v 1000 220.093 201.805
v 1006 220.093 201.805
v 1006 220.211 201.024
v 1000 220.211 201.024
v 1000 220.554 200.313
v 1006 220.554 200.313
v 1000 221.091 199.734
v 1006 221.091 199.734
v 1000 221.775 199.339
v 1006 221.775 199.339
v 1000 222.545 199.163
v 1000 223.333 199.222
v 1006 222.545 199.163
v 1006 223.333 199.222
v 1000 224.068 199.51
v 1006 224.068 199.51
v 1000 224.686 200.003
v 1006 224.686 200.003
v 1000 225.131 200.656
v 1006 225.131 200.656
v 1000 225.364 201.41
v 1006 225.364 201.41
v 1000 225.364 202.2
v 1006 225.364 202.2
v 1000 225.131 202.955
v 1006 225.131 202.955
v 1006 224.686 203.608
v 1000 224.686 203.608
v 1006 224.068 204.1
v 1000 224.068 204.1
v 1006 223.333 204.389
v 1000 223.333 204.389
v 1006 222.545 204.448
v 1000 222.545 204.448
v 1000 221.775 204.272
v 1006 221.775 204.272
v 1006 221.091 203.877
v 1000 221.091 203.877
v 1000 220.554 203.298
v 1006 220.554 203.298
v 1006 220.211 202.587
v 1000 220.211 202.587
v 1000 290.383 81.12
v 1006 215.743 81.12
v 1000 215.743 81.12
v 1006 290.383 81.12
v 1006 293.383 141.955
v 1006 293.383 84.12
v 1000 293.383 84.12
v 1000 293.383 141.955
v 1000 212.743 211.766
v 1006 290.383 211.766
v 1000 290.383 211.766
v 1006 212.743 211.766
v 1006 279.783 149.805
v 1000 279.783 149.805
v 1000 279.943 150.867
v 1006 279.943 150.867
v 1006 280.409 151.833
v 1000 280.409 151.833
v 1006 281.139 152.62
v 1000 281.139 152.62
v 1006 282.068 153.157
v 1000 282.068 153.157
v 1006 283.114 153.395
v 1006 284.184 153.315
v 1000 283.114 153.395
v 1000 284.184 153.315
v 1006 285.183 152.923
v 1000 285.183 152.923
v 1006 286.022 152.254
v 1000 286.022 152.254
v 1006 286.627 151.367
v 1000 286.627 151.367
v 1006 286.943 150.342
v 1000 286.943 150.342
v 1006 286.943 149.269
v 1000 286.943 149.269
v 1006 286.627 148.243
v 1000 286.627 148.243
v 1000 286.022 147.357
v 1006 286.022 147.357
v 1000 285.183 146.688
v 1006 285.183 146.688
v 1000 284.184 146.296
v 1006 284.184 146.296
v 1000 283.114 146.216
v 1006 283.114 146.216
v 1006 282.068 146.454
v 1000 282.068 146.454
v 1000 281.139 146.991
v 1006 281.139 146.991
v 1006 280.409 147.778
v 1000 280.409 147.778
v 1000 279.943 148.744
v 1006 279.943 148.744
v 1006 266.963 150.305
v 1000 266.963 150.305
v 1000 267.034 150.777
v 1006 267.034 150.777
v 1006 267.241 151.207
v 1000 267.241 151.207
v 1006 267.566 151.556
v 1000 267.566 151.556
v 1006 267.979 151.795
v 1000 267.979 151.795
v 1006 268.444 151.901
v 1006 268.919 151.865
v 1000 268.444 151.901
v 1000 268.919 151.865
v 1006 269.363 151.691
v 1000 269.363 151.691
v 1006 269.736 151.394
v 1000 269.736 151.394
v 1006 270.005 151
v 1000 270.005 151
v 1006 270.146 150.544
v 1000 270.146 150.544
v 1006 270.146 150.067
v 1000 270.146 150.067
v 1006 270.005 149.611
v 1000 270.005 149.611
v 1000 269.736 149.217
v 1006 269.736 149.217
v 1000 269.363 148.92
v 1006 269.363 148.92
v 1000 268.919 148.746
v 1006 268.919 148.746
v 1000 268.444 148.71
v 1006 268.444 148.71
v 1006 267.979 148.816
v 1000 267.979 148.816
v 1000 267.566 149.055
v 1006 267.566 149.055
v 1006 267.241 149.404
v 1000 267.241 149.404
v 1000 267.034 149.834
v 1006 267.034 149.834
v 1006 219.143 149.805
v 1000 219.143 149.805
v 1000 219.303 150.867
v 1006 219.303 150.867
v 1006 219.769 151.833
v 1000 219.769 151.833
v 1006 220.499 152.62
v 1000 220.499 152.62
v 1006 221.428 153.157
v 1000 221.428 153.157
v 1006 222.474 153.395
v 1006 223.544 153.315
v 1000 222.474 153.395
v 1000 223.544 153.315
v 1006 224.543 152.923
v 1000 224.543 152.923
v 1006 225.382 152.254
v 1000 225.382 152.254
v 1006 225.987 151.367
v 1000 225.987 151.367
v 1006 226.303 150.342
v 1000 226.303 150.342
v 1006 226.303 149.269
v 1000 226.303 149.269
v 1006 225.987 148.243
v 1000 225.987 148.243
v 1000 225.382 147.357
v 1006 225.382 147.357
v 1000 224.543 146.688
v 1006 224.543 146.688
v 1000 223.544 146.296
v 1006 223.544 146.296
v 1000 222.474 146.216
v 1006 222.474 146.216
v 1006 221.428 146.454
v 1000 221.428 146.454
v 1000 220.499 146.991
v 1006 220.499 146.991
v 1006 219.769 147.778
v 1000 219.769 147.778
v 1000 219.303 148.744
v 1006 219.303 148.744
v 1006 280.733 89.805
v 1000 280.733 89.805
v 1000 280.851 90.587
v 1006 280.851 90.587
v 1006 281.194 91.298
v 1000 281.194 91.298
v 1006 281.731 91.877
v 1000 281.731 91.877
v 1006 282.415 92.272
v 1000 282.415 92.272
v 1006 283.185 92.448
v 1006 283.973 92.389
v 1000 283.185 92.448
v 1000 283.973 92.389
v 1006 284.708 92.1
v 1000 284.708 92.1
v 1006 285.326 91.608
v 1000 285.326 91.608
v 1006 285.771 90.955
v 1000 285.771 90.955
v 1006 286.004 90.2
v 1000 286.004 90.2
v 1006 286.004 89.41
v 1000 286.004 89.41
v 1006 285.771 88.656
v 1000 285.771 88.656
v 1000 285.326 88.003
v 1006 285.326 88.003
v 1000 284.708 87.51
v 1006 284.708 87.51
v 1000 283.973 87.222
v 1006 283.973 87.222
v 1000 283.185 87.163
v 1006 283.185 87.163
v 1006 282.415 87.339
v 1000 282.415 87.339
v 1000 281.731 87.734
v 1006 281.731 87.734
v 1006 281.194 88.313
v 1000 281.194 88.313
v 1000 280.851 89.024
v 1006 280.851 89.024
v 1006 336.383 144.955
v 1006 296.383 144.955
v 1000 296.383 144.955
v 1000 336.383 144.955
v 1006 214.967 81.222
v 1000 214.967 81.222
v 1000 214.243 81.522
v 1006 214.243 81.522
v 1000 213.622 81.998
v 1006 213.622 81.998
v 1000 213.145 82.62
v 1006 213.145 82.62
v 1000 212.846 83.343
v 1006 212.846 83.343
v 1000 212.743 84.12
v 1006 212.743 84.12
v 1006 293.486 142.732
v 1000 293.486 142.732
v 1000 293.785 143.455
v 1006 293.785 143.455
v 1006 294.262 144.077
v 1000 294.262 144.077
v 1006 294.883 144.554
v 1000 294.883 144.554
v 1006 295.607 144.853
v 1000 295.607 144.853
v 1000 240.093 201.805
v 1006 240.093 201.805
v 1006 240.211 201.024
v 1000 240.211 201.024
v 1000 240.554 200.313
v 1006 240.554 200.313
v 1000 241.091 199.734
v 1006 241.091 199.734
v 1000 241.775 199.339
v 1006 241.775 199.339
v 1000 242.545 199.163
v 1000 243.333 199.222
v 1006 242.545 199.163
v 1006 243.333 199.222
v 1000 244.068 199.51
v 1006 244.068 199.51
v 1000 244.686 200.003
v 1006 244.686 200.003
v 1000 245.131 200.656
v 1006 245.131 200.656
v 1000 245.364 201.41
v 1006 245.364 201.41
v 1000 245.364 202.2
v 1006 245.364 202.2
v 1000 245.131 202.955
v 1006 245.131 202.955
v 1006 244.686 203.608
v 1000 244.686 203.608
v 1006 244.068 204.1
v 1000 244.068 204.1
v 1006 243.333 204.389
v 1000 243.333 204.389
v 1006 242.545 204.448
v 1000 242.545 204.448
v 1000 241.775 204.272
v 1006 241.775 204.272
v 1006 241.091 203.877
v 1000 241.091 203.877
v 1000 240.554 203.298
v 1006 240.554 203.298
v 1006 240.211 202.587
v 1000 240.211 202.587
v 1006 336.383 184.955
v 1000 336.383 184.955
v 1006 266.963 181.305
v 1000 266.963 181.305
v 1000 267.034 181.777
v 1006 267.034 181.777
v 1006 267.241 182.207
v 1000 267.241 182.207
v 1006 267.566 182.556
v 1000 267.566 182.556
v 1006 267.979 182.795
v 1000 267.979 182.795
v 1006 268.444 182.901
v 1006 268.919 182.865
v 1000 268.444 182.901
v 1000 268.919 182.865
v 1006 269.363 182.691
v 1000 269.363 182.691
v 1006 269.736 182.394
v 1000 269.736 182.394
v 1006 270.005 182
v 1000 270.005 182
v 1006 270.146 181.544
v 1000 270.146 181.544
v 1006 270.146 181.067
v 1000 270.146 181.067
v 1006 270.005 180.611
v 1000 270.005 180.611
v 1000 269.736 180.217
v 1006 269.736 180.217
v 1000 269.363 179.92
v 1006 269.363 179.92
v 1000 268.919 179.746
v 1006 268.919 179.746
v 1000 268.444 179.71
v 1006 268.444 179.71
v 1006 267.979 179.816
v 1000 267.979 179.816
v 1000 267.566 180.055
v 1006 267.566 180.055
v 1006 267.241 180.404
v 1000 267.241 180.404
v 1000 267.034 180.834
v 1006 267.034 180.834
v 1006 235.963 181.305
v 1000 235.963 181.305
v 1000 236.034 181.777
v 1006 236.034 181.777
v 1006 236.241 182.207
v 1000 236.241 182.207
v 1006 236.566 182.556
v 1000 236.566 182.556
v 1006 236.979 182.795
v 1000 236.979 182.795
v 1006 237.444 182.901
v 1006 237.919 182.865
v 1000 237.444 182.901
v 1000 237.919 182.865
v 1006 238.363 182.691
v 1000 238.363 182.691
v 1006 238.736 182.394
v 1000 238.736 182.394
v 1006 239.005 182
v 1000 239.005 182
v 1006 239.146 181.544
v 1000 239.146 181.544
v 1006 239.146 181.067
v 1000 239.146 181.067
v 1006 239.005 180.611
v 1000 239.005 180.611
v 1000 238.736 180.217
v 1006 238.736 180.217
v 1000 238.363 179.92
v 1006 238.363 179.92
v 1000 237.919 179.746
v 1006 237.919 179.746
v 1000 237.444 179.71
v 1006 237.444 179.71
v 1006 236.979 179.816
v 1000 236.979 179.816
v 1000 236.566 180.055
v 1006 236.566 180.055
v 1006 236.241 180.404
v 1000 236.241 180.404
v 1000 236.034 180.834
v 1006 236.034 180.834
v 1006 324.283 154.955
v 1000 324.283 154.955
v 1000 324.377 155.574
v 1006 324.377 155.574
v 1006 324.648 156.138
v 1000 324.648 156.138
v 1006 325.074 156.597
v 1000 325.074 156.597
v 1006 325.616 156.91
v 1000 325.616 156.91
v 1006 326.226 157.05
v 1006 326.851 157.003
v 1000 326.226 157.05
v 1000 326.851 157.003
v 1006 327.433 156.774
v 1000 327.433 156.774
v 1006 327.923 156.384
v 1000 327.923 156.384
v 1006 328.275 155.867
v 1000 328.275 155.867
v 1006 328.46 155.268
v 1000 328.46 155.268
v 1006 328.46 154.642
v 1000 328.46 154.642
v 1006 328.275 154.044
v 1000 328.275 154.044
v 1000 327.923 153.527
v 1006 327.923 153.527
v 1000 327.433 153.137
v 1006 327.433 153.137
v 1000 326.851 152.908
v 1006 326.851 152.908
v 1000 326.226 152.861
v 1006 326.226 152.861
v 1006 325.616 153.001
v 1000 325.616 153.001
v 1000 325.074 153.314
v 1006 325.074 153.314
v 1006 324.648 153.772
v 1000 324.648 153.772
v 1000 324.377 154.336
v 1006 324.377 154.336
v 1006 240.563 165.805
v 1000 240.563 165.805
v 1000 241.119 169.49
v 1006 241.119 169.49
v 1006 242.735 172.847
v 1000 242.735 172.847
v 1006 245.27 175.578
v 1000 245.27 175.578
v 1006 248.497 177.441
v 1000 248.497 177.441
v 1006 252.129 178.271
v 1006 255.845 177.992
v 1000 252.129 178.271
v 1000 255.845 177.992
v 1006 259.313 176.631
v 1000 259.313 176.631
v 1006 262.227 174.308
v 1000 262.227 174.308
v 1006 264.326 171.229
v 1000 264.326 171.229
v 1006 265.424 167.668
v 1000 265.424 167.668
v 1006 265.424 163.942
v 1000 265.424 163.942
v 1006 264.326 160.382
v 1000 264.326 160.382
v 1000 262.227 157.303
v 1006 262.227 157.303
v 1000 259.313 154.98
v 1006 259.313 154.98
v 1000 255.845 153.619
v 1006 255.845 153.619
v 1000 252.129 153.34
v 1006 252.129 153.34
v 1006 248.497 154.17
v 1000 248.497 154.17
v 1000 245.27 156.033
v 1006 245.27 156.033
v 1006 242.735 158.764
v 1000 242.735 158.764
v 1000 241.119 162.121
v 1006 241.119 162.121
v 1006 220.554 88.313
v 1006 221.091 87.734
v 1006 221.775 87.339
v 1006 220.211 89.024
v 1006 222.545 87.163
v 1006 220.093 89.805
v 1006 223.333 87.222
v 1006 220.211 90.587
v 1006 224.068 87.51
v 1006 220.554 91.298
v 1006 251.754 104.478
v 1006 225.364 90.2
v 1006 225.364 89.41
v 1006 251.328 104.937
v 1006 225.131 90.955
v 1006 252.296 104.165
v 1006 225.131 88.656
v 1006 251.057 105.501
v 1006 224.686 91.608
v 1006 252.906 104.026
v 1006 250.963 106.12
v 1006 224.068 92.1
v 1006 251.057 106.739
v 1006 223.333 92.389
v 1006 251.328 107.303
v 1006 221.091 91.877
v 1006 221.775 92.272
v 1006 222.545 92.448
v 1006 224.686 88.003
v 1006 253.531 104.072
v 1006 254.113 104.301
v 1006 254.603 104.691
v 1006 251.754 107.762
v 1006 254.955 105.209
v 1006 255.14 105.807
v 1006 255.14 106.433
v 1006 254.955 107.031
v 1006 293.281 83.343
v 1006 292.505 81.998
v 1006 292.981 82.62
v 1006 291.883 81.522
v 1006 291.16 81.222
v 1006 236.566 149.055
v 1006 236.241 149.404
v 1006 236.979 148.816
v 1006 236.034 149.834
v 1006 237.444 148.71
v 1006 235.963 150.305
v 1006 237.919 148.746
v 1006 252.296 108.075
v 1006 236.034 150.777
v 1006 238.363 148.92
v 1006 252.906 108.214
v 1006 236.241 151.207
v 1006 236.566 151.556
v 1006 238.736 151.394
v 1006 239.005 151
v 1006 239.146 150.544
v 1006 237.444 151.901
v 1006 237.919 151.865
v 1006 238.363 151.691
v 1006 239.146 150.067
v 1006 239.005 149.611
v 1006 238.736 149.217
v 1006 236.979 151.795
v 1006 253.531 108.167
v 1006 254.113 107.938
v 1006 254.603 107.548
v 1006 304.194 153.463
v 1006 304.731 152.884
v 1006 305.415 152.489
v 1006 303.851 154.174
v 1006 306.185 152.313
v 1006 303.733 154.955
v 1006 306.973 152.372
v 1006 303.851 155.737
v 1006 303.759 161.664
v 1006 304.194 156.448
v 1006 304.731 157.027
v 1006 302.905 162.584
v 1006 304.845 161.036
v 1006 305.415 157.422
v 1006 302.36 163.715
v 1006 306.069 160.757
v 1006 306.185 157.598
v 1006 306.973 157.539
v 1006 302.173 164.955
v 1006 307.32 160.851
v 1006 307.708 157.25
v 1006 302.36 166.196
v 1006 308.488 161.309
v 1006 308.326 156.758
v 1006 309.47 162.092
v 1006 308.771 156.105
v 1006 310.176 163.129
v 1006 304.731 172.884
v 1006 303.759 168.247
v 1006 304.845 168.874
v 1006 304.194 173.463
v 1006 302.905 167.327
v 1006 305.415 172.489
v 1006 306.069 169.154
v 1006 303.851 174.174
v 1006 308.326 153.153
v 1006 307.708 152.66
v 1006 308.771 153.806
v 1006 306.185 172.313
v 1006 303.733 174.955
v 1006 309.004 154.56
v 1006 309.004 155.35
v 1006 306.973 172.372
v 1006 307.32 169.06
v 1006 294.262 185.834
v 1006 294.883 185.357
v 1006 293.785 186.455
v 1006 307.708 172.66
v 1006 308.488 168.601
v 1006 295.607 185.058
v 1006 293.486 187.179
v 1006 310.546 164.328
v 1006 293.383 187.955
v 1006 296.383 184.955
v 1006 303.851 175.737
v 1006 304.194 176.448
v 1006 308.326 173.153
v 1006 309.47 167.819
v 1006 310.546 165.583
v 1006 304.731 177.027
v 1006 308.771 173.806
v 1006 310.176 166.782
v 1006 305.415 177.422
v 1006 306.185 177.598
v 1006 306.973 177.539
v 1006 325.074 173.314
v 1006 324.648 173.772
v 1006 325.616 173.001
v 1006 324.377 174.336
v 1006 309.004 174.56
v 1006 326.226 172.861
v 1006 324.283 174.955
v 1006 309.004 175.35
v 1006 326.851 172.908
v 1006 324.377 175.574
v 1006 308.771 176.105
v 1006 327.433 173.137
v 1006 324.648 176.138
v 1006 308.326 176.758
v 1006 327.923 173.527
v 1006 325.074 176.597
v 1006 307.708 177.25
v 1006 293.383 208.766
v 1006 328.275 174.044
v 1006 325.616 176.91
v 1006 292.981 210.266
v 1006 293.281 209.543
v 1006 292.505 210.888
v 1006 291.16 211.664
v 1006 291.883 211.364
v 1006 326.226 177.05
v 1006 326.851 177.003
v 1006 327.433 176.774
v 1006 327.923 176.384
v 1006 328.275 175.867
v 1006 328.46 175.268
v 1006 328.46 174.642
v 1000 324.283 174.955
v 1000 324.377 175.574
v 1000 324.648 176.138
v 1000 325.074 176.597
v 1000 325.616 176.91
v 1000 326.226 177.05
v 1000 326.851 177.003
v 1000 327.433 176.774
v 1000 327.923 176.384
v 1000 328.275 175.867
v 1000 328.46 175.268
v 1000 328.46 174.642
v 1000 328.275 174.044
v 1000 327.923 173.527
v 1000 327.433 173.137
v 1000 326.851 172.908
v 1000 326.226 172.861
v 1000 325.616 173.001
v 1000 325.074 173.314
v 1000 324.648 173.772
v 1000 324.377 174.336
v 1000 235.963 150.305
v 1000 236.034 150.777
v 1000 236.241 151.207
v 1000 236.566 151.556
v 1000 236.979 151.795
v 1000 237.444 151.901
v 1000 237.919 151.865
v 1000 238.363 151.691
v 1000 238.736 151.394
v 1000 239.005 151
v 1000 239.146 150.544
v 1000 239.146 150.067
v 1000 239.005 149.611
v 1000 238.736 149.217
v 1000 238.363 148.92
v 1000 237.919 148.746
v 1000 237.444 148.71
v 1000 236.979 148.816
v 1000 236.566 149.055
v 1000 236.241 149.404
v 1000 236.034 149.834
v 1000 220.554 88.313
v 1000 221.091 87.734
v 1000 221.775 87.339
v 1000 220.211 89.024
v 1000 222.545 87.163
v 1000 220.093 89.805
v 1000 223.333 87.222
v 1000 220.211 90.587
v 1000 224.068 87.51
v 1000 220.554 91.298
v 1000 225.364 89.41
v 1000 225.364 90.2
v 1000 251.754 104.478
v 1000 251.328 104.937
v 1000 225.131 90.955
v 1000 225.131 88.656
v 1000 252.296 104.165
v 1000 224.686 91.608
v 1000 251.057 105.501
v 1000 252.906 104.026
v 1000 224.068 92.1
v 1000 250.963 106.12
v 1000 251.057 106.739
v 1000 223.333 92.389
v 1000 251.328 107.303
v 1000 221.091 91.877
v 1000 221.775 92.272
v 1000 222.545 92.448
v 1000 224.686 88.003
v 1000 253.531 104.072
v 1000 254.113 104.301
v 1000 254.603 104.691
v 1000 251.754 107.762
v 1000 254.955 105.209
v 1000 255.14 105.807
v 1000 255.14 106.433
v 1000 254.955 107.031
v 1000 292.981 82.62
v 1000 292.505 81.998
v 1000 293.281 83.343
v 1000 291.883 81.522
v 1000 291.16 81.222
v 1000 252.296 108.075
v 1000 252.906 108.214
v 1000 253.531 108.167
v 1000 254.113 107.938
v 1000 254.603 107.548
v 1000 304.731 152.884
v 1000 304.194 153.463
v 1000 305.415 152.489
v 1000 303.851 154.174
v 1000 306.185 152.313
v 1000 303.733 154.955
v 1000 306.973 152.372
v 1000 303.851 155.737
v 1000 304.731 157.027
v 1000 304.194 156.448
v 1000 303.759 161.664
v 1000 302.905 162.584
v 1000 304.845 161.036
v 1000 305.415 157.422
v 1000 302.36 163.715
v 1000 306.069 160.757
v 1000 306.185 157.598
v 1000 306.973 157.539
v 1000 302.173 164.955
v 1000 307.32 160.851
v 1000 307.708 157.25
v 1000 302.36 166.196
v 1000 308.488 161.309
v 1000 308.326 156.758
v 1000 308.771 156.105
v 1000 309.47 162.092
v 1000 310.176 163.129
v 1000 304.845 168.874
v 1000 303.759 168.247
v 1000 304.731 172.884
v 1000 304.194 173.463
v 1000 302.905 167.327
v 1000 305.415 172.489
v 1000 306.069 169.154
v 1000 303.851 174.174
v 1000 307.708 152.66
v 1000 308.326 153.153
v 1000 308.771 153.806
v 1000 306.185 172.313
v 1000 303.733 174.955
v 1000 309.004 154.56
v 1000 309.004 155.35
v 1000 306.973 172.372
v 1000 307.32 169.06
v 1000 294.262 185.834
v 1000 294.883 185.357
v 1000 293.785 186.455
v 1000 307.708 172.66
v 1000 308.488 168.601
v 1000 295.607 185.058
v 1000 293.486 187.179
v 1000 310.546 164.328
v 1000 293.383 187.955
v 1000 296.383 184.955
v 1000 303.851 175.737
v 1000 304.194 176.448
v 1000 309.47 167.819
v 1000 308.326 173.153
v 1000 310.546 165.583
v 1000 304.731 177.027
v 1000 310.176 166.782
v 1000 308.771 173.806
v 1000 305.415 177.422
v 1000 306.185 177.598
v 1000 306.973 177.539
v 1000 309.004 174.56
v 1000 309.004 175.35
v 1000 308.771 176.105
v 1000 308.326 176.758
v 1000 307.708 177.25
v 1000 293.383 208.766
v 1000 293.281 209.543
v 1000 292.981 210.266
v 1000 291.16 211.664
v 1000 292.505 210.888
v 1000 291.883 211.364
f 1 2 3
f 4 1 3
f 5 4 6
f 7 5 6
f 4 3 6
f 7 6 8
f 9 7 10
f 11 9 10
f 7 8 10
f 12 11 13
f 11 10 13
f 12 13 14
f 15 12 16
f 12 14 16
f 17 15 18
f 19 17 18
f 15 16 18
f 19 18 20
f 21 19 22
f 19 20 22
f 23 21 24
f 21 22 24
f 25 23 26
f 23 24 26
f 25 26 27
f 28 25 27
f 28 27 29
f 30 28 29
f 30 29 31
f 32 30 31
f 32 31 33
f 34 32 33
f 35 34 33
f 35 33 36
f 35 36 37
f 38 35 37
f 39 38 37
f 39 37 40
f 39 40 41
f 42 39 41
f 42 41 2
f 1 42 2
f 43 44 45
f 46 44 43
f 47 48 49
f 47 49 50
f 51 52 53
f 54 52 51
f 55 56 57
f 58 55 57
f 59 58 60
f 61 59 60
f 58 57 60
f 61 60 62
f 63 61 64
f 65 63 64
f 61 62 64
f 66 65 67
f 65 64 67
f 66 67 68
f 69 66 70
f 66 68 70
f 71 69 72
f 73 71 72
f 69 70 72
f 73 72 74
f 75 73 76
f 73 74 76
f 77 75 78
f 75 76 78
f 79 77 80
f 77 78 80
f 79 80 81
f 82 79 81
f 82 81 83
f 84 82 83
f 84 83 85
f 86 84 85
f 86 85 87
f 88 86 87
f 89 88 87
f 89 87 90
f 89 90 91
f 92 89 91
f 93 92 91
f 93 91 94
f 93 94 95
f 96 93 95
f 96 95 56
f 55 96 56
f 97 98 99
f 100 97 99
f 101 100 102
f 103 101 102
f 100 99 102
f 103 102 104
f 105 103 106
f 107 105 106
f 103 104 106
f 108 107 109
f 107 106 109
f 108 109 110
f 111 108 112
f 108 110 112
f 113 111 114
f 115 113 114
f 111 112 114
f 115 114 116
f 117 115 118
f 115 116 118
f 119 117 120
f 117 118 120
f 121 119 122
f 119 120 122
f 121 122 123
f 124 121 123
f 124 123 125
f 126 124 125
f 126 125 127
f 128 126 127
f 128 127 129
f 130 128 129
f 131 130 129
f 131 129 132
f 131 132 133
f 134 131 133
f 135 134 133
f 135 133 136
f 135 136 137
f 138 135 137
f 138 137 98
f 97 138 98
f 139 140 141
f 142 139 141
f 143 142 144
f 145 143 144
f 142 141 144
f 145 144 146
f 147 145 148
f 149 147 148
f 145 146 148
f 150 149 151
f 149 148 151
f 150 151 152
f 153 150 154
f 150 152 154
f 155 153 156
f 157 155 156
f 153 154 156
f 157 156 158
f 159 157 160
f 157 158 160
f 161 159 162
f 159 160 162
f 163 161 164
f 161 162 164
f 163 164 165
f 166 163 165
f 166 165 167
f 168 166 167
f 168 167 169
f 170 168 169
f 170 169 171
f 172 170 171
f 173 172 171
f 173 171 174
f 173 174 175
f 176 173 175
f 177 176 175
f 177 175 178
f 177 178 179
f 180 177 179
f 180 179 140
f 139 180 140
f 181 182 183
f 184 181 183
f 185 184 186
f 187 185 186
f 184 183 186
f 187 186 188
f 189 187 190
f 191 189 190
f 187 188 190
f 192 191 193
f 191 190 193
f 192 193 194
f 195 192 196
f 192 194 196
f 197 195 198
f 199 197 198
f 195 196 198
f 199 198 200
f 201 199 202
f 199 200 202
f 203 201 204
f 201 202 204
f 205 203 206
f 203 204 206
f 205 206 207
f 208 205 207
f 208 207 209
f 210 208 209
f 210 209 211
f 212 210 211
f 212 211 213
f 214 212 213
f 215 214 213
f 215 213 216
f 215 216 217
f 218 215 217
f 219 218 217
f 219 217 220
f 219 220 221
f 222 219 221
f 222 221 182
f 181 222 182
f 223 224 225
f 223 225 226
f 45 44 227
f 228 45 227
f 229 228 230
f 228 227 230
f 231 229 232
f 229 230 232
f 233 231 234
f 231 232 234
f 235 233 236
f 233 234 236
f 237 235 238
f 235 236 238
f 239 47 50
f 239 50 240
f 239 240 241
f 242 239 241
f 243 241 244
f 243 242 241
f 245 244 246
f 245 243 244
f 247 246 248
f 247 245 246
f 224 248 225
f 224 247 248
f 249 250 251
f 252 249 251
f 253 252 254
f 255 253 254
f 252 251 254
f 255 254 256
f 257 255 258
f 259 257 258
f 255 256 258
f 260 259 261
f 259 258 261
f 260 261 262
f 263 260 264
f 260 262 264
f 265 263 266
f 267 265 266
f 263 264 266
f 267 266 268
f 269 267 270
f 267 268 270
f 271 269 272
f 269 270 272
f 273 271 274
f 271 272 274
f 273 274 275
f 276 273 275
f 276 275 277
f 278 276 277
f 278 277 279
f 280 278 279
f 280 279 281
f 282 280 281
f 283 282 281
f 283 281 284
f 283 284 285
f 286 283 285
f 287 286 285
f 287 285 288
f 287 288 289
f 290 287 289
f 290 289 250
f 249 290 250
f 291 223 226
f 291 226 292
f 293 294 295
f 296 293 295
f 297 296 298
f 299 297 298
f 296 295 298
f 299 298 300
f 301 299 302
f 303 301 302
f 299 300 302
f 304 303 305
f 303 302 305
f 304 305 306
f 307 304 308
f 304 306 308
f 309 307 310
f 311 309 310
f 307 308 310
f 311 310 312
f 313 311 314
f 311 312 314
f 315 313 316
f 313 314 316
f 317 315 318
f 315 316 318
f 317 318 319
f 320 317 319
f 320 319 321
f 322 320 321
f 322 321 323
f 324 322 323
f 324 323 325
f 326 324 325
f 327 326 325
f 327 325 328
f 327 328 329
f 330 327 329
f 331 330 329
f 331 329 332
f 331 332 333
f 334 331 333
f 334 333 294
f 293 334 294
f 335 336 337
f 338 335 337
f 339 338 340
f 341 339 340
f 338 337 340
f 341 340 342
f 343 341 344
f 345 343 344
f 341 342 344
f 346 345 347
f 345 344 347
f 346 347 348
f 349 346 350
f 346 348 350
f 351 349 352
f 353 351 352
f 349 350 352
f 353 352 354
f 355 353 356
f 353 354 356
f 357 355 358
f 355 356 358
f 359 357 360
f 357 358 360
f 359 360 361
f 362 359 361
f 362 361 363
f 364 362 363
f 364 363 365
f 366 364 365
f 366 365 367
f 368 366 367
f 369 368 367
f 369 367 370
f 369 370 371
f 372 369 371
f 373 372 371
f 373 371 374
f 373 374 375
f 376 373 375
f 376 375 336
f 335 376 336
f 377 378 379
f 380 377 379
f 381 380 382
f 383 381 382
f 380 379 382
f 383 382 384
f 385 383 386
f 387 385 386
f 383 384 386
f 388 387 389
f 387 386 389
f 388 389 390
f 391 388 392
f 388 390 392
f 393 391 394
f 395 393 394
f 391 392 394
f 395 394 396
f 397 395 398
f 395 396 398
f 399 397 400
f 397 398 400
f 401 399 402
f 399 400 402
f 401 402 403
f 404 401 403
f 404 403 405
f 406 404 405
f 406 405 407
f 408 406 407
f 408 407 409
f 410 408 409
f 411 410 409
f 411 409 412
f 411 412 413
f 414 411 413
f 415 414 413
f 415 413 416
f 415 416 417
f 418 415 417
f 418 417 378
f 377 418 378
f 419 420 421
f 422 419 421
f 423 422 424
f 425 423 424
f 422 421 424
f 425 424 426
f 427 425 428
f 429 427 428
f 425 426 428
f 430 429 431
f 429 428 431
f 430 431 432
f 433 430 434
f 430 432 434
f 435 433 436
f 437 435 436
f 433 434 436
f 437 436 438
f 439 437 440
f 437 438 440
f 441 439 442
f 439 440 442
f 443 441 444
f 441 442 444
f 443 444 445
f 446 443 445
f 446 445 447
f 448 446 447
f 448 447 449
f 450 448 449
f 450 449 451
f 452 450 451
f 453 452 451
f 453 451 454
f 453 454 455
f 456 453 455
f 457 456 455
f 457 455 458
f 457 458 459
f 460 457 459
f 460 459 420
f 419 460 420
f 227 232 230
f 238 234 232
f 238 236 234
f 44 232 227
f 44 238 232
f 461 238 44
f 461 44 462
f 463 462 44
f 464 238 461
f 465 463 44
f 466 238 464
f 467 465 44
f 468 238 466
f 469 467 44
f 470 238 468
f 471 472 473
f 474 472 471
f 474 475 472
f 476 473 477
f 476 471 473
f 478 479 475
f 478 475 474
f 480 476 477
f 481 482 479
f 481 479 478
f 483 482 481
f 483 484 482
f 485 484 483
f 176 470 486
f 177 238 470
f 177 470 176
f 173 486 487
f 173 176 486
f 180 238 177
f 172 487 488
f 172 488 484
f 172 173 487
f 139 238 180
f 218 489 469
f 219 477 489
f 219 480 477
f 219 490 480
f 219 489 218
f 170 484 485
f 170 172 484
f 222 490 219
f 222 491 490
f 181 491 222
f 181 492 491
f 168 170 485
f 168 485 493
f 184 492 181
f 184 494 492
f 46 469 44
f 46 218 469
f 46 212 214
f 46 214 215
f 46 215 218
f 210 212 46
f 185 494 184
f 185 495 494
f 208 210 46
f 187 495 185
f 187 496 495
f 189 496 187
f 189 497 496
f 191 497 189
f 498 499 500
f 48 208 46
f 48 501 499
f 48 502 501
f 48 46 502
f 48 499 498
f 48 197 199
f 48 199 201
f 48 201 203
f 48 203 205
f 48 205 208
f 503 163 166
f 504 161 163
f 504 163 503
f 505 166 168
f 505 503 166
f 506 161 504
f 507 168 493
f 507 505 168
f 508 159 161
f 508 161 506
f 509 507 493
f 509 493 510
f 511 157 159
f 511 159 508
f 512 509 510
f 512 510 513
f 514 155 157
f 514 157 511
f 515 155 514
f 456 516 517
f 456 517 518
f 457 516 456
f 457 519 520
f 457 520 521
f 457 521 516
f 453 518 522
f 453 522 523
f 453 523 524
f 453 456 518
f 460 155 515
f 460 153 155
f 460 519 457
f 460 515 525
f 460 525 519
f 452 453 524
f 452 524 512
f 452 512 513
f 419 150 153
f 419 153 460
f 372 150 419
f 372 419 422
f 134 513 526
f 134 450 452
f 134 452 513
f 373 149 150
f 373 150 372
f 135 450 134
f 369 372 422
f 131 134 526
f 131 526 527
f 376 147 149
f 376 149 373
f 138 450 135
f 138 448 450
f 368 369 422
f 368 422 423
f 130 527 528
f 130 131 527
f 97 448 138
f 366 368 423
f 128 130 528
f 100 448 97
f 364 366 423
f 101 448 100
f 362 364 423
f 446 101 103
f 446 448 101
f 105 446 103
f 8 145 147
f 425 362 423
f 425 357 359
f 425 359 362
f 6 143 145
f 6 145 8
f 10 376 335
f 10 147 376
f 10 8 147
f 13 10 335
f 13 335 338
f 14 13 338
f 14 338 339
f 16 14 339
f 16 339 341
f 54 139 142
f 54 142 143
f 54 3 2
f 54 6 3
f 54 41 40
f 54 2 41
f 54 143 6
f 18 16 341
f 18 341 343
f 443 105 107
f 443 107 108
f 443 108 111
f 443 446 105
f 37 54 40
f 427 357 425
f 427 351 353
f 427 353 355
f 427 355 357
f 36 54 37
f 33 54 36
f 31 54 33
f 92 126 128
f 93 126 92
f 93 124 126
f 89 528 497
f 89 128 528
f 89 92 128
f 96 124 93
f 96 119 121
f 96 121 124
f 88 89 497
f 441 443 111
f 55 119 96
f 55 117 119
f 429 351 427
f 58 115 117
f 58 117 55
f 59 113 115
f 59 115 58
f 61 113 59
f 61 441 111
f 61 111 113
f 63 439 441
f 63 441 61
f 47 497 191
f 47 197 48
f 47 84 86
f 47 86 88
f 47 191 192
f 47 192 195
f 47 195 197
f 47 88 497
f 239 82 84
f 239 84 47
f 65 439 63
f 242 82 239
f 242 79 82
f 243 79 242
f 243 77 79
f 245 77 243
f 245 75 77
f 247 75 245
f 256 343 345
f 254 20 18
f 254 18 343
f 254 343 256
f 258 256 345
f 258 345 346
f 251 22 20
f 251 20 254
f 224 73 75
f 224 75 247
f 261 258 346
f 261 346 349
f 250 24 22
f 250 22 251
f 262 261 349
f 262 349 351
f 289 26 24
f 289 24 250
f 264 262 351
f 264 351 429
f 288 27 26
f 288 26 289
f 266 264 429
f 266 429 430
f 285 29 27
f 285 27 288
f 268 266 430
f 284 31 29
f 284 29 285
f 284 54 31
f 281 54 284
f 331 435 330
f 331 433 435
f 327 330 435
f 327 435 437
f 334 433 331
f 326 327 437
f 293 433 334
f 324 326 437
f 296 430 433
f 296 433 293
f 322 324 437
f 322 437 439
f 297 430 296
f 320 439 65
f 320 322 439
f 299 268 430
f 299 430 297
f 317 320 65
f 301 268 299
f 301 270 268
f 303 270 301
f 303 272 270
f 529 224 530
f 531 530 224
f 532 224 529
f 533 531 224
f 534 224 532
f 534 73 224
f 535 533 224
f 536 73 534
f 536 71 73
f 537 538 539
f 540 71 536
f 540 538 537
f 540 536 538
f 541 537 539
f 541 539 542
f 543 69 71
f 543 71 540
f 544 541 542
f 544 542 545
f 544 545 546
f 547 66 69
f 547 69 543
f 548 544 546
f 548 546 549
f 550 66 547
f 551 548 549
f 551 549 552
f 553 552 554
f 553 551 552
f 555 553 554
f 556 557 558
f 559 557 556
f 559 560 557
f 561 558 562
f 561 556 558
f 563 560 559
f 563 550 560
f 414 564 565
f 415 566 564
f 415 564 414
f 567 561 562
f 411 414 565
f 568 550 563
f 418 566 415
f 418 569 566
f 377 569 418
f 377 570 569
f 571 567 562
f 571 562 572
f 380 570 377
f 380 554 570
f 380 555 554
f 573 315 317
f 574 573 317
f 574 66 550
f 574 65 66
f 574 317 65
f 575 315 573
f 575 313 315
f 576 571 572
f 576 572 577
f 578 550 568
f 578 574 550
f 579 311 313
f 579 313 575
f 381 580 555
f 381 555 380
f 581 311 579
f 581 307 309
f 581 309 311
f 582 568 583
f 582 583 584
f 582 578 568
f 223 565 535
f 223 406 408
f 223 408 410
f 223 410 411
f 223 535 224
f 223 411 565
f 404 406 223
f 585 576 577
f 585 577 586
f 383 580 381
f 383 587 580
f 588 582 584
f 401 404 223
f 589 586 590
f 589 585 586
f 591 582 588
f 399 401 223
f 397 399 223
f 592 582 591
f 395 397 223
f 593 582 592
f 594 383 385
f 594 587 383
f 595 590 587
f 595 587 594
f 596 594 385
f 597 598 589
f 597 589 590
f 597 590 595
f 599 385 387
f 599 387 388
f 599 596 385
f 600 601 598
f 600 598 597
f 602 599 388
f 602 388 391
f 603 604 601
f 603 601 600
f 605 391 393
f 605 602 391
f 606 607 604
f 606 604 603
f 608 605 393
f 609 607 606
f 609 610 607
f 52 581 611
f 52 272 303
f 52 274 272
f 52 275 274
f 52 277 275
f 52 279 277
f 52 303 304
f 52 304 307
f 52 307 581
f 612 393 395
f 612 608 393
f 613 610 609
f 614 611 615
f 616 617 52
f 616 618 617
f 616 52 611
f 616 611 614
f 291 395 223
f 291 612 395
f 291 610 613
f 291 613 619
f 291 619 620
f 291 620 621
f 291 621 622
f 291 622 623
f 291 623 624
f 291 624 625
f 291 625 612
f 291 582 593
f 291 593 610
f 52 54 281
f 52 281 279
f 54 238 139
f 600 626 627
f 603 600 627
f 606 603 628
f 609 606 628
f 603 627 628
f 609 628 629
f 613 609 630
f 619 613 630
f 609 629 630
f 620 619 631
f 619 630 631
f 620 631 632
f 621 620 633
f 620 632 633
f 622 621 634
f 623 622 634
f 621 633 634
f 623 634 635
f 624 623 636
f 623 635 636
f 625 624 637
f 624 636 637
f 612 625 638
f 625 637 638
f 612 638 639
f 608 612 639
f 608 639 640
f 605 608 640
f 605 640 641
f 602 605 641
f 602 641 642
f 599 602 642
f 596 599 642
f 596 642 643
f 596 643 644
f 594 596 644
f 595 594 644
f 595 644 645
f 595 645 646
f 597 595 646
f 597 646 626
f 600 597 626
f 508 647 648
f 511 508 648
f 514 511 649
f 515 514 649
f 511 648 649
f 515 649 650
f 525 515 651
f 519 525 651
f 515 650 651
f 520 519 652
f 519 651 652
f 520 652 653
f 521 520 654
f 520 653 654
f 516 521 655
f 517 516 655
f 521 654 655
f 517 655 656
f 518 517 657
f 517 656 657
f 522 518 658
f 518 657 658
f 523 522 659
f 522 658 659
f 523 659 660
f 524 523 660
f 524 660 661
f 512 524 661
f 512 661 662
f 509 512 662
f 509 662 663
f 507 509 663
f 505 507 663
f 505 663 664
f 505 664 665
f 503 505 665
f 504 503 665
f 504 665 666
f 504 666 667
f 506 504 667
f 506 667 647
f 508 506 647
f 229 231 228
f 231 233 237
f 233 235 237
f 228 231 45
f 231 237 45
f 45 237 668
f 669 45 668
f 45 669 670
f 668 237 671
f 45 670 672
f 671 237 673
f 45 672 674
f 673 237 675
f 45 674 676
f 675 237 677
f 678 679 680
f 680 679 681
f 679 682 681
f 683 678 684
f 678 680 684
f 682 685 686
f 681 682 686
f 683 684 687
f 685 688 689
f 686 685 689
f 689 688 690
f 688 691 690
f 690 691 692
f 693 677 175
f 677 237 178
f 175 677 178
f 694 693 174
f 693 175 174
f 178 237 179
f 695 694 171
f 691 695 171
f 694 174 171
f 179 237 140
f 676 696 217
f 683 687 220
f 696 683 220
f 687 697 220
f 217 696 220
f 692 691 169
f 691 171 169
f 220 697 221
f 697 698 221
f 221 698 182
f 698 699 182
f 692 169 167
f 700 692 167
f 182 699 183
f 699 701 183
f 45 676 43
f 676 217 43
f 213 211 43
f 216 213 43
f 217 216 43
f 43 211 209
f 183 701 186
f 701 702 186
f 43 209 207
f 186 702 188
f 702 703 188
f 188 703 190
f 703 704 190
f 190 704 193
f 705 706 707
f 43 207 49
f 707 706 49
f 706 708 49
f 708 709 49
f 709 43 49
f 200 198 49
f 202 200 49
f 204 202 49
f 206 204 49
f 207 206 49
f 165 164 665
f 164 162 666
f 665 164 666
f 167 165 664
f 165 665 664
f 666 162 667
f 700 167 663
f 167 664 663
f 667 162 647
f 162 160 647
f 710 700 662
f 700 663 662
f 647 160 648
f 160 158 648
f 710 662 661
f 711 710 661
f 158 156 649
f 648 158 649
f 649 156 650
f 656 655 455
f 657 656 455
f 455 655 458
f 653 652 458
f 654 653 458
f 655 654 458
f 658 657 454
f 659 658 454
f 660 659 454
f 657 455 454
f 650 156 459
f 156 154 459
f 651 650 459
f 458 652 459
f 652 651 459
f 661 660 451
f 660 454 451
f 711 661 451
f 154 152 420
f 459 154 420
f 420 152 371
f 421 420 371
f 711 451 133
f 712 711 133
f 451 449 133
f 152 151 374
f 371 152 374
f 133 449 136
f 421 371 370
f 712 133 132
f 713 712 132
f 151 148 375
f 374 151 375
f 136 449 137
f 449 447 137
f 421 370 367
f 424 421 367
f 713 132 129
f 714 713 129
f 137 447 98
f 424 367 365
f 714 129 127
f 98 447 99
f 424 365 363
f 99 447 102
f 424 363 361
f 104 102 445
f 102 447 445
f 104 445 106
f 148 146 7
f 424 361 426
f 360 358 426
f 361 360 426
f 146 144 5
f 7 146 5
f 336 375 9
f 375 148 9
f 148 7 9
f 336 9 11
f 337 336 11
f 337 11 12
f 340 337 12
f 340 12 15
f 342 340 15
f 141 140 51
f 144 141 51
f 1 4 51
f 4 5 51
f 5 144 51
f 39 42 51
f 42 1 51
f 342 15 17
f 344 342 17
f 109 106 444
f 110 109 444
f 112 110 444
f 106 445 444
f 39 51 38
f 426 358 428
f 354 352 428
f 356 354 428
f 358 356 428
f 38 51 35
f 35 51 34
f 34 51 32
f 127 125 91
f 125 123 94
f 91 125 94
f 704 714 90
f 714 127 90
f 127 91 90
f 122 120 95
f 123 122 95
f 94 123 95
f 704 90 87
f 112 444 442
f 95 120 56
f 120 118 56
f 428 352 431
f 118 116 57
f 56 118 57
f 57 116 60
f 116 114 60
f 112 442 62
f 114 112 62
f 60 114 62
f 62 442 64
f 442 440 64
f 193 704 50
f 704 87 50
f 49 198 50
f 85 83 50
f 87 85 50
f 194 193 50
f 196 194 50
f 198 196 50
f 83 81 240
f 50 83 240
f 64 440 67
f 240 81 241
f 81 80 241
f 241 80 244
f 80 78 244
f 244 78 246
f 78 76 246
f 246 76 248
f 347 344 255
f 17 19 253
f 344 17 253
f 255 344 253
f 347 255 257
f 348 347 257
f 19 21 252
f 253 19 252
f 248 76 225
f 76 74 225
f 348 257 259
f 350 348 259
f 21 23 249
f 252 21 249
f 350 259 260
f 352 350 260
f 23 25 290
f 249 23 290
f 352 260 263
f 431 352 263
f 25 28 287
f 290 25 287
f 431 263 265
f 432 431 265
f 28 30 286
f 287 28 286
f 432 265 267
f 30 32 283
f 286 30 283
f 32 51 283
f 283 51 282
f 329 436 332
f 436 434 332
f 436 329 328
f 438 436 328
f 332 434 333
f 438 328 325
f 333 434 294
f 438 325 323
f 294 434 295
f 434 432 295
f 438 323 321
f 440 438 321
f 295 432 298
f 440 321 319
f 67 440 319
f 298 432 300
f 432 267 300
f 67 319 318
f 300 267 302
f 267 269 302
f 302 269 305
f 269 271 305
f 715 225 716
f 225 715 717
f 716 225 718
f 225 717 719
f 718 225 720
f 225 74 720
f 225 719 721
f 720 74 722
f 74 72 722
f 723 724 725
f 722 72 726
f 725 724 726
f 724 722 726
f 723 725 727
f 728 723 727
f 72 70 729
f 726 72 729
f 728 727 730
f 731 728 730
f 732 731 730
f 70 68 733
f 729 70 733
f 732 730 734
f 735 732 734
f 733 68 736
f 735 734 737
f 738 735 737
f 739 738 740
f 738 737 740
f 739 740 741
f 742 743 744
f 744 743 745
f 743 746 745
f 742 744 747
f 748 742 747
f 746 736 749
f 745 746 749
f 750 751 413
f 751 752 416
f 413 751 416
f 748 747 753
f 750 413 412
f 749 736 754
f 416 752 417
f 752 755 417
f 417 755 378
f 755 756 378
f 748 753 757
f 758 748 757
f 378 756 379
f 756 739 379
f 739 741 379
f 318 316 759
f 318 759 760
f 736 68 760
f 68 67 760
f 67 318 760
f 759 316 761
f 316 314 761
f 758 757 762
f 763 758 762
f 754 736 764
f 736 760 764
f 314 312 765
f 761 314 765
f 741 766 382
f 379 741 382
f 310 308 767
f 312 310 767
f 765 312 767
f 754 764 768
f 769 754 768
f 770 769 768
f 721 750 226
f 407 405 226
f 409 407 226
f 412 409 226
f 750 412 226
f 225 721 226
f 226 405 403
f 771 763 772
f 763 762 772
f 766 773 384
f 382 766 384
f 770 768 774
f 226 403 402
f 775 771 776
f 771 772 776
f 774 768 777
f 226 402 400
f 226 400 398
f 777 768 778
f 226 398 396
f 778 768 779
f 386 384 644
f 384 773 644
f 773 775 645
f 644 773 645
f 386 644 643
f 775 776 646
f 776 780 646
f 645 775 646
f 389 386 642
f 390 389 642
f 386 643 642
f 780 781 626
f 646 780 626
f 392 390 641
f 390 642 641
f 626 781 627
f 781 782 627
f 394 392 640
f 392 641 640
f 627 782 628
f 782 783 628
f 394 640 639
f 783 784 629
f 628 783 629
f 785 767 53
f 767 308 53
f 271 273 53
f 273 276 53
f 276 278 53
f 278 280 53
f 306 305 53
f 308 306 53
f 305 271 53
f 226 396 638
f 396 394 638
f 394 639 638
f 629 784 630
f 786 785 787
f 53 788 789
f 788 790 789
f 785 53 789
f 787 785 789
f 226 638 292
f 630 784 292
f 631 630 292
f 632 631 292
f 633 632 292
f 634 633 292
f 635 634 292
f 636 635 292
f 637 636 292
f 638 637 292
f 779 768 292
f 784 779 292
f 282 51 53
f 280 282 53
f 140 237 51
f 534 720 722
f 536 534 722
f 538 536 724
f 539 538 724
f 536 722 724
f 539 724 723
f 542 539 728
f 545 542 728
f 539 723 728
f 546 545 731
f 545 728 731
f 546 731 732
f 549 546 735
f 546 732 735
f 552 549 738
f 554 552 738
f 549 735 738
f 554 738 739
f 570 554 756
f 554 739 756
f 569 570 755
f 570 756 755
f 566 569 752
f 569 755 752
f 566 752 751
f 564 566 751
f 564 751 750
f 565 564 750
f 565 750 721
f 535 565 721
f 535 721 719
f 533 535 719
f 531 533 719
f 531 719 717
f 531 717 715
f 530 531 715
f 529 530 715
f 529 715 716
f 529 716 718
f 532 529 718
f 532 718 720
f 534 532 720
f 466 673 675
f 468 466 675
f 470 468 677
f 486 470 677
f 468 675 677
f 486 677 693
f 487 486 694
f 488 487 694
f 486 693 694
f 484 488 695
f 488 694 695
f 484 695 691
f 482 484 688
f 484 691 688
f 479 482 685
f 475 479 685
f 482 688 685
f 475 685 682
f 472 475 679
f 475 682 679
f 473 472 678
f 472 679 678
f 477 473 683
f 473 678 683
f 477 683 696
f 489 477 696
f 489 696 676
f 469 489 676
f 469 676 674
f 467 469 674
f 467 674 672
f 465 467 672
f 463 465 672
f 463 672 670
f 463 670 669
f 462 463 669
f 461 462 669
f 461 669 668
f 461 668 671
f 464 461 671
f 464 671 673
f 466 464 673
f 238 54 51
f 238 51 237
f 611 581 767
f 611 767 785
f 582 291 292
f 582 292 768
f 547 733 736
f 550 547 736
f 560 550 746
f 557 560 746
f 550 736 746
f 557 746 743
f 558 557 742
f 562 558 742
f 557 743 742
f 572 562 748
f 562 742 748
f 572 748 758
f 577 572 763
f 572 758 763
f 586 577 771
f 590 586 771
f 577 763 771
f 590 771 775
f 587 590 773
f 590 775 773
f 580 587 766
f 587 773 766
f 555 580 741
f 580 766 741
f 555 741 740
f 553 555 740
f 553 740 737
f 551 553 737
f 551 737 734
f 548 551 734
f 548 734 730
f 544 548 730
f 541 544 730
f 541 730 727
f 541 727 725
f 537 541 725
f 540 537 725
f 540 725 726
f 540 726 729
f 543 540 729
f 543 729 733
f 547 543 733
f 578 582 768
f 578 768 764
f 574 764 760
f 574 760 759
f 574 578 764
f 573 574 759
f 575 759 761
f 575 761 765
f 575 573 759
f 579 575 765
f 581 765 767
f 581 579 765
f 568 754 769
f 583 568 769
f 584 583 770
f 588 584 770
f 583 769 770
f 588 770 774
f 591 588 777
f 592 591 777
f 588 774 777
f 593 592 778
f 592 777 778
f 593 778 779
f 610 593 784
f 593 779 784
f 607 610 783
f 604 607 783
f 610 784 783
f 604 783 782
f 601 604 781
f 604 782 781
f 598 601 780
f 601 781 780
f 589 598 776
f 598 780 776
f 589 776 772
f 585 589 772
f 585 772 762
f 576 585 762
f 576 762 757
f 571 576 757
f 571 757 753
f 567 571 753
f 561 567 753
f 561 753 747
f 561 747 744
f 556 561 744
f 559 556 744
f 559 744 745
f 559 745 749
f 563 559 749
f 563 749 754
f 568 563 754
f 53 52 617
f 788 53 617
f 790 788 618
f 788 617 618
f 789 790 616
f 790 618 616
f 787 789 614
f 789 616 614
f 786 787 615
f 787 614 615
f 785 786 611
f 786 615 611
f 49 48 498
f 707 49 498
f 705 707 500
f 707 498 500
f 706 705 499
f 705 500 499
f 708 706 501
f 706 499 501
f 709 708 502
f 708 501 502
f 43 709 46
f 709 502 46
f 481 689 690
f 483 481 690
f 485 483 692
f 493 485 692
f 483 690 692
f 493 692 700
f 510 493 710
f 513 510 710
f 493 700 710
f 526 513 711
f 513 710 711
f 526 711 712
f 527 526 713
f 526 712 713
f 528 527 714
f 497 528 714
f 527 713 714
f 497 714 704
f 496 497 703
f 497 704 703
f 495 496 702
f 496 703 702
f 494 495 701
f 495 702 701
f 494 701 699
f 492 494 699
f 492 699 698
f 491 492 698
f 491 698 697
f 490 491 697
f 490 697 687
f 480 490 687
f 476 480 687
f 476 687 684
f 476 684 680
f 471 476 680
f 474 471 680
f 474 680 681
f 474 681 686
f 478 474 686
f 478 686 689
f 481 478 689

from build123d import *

# Parameters (mm, degrees)
PAD005_DEPTH             = 6
SKETCH025_R              = 2.1
HOLE006_DEPTH            = 25
SKETCH026_R              = 3.6
HOLE007_DEPTH            = 25
SKETCH027_R              = 2.65
HOLE008_DEPTH            = 25
SKETCH028_R              = 1.6
HOLE009_DEPTH            = 25
SKETCH029_R              = 12.5
POCKET001_DEPTH          = 6.001
SKETCH030_R              = 2.65
HOLE010_DEPTH            = 25
SKETCH031_R              = 2.65
HOLE011_DEPTH            = 25
SKETCH032_R              = 2.1
HOLE012_DEPTH            = 25
SKETCH033_R              = 4.21
POCKET_DEPTH             = 6.001
BODY013_ROLL_ANGLE       = 90
BODY013_PLACEMENT_ANGLE  = -90
CLONE005_PLACEMENT_ANGLE = 180
BODY014_PLACEMENT_ANGLE  = 180


with BuildPart() as part:
    # Sketch → Pad005 (new body)
    with BuildSketch(Plane.XY):
        with BuildLine():
            Line((-53.583397, -36.74454), (-53.583397, 3.25546))
            Line((-53.583397, 3.25546), (-13.583397, 3.25546))
            ThreePointArc((-13.583397, 3.25546), (-11.462077, 4.134139), (-10.583397, 6.25546))
            Line((-10.583397, 6.25546), (-10.583397, 27.066205))
            ThreePointArc((-7.583397, 30.066205), (-9.704717, 29.187525), (-10.583397, 27.066205))
            Line((-7.583397, 30.066205), (70.056603, 30.066205))
            Line((70.056603, 30.066205), (70.056603, -97.580221))
            ThreePointArc((67.056603, -100.580221), (69.177923, -99.701542), (70.056603, -97.580221))
            Line((67.056603, -100.580221), (-7.583397, -100.580221))
            ThreePointArc((-10.583397, -97.580221), (-9.704717, -99.701542), (-7.583397, -100.580221))
            Line((-10.583397, -97.580221), (-10.583397, -39.74454))
            ThreePointArc((-10.583397, -39.74454), (-11.462077, -37.62322), (-13.583397, -36.74454))
            Line((-13.583397, -36.74454), (-53.583397, -36.74454))
        make_face()
    extrude(amount=PAD005_DEPTH)

    # Sketch025 (on Face15 of Pad005) → Hole006 (cut)
    with BuildSketch(Plane.XY.offset(6)):
        with Locations((-43.583397, -6.74454)):
            Circle(SKETCH025_R)
        with Locations((-43.583397, -26.74454)):
            Circle(SKETCH025_R)
    extrude(amount=-HOLE006_DEPTH, mode=Mode.SUBTRACT)

    # Sketch026 (on Face5 of Hole006) → Hole007 (cut)
    with BuildSketch(Plane.XY.offset(6)):
        with Locations((-0.583397, -31.89454)):
            Circle(SKETCH026_R)
        with Locations((60.056603, -31.89454)):
            Circle(SKETCH026_R)
    extrude(amount=-HOLE007_DEPTH, mode=Mode.SUBTRACT)

    # Sketch027 (on Face5 of Hole007) → Hole008 (cut)
    with BuildSketch(Plane.XY.offset(6)):
        with Locations((-0.583397, -91.89454)):
            Circle(SKETCH027_R)
        with Locations((60.056603, -91.89454)):
            Circle(SKETCH027_R)
    extrude(amount=-HOLE008_DEPTH, mode=Mode.SUBTRACT)

    # Sketch028 (on Face5 of Hole008) → Hole009 (cut)
    with BuildSketch(Plane.XY.offset(6)):
        with Locations((14.236603, -0.39454)):
            Circle(SKETCH028_R)
        with Locations((45.236603, -0.39454)):
            Circle(SKETCH028_R)
        with Locations((14.236603, -31.39454)):
            Circle(SKETCH028_R)
        with Locations((45.236603, -31.39454)):
            Circle(SKETCH028_R)
    extrude(amount=-HOLE009_DEPTH, mode=Mode.SUBTRACT)

    # Sketch029 (on Face5 of Hole009) → Pocket001 (cut, through all)
    with BuildSketch(Plane.XY.offset(6)):
        with Locations((29.736603, -15.89454)):
            Circle(SKETCH029_R)
    extrude(amount=-POCKET001_DEPTH, mode=Mode.SUBTRACT)

    # Sketch030 (on Face4 of Clone004) → Hole010 (cut)
    with BuildSketch(Plane(origin=(0, 0, 0), x_dir=(1, 0, 0), z_dir=(0, 0, -1))):
        with Locations((40.056603, -20.10546)):
            Circle(SKETCH030_R)
        with Locations((60.056603, -20.10546)):
            Circle(SKETCH030_R)
    extrude(amount=-HOLE010_DEPTH, mode=Mode.SUBTRACT)

    # Sketch031 (on Face5 of Hole010) → Hole011 (cut)
    with BuildSketch(Plane.XY.offset(6)):
        with Locations((-23.583397, -6.74454)):
            Circle(SKETCH031_R)
        with Locations((-23.583397, -26.74454)):
            Circle(SKETCH031_R)
    extrude(amount=-HOLE011_DEPTH, mode=Mode.SUBTRACT)

    # Sketch032 (on Face5 of Hole011) → Hole012 (cut)
    with BuildSketch(Plane.XY.offset(6)):
        with Locations((29.736603, -75.580221)):
            Circle(SKETCH032_R)
    extrude(amount=-HOLE012_DEPTH, mode=Mode.SUBTRACT)

    # Sketch033 (on Face5 of Hole012) → Pocket (cut, through all)
    with BuildSketch(Plane.XY.offset(6)):
        with Locations((-23.583397, -16.74454)):
            Circle(SKETCH033_R)
    extrude(amount=-POCKET_DEPTH, mode=Mode.SUBTRACT)


with BuildPart() as part_1:
    # Body013 roll: moved
    add(part.part.rotate(Axis((0, 0, 0), (1, 0, 0)), BODY013_ROLL_ANGLE))


with BuildPart() as part_2:
    # Body013 placement: moved
    add(part_1.part.moved(Location((0, 283, 181.7))).rotate(Axis((0, 283, 181.7), (0, 0, 1)), BODY013_PLACEMENT_ANGLE))


with BuildPart() as part_3:
    # Clone005 placement: moved
    add(part_2.part.moved(Location((-6, 586.6, 0))).rotate(Axis((-6, 586.6, 0), (0, 0, 1)), CLONE005_PLACEMENT_ANGLE))


with BuildPart() as part_4:
    # Body014 placement: moved
    add(part_3.part.moved(Location((1000, 586.4, 0))).rotate(Axis((1000, 586.4, 0), (0, 0, 1)), BODY014_PLACEMENT_ANGLE))


solid = part_4.part
